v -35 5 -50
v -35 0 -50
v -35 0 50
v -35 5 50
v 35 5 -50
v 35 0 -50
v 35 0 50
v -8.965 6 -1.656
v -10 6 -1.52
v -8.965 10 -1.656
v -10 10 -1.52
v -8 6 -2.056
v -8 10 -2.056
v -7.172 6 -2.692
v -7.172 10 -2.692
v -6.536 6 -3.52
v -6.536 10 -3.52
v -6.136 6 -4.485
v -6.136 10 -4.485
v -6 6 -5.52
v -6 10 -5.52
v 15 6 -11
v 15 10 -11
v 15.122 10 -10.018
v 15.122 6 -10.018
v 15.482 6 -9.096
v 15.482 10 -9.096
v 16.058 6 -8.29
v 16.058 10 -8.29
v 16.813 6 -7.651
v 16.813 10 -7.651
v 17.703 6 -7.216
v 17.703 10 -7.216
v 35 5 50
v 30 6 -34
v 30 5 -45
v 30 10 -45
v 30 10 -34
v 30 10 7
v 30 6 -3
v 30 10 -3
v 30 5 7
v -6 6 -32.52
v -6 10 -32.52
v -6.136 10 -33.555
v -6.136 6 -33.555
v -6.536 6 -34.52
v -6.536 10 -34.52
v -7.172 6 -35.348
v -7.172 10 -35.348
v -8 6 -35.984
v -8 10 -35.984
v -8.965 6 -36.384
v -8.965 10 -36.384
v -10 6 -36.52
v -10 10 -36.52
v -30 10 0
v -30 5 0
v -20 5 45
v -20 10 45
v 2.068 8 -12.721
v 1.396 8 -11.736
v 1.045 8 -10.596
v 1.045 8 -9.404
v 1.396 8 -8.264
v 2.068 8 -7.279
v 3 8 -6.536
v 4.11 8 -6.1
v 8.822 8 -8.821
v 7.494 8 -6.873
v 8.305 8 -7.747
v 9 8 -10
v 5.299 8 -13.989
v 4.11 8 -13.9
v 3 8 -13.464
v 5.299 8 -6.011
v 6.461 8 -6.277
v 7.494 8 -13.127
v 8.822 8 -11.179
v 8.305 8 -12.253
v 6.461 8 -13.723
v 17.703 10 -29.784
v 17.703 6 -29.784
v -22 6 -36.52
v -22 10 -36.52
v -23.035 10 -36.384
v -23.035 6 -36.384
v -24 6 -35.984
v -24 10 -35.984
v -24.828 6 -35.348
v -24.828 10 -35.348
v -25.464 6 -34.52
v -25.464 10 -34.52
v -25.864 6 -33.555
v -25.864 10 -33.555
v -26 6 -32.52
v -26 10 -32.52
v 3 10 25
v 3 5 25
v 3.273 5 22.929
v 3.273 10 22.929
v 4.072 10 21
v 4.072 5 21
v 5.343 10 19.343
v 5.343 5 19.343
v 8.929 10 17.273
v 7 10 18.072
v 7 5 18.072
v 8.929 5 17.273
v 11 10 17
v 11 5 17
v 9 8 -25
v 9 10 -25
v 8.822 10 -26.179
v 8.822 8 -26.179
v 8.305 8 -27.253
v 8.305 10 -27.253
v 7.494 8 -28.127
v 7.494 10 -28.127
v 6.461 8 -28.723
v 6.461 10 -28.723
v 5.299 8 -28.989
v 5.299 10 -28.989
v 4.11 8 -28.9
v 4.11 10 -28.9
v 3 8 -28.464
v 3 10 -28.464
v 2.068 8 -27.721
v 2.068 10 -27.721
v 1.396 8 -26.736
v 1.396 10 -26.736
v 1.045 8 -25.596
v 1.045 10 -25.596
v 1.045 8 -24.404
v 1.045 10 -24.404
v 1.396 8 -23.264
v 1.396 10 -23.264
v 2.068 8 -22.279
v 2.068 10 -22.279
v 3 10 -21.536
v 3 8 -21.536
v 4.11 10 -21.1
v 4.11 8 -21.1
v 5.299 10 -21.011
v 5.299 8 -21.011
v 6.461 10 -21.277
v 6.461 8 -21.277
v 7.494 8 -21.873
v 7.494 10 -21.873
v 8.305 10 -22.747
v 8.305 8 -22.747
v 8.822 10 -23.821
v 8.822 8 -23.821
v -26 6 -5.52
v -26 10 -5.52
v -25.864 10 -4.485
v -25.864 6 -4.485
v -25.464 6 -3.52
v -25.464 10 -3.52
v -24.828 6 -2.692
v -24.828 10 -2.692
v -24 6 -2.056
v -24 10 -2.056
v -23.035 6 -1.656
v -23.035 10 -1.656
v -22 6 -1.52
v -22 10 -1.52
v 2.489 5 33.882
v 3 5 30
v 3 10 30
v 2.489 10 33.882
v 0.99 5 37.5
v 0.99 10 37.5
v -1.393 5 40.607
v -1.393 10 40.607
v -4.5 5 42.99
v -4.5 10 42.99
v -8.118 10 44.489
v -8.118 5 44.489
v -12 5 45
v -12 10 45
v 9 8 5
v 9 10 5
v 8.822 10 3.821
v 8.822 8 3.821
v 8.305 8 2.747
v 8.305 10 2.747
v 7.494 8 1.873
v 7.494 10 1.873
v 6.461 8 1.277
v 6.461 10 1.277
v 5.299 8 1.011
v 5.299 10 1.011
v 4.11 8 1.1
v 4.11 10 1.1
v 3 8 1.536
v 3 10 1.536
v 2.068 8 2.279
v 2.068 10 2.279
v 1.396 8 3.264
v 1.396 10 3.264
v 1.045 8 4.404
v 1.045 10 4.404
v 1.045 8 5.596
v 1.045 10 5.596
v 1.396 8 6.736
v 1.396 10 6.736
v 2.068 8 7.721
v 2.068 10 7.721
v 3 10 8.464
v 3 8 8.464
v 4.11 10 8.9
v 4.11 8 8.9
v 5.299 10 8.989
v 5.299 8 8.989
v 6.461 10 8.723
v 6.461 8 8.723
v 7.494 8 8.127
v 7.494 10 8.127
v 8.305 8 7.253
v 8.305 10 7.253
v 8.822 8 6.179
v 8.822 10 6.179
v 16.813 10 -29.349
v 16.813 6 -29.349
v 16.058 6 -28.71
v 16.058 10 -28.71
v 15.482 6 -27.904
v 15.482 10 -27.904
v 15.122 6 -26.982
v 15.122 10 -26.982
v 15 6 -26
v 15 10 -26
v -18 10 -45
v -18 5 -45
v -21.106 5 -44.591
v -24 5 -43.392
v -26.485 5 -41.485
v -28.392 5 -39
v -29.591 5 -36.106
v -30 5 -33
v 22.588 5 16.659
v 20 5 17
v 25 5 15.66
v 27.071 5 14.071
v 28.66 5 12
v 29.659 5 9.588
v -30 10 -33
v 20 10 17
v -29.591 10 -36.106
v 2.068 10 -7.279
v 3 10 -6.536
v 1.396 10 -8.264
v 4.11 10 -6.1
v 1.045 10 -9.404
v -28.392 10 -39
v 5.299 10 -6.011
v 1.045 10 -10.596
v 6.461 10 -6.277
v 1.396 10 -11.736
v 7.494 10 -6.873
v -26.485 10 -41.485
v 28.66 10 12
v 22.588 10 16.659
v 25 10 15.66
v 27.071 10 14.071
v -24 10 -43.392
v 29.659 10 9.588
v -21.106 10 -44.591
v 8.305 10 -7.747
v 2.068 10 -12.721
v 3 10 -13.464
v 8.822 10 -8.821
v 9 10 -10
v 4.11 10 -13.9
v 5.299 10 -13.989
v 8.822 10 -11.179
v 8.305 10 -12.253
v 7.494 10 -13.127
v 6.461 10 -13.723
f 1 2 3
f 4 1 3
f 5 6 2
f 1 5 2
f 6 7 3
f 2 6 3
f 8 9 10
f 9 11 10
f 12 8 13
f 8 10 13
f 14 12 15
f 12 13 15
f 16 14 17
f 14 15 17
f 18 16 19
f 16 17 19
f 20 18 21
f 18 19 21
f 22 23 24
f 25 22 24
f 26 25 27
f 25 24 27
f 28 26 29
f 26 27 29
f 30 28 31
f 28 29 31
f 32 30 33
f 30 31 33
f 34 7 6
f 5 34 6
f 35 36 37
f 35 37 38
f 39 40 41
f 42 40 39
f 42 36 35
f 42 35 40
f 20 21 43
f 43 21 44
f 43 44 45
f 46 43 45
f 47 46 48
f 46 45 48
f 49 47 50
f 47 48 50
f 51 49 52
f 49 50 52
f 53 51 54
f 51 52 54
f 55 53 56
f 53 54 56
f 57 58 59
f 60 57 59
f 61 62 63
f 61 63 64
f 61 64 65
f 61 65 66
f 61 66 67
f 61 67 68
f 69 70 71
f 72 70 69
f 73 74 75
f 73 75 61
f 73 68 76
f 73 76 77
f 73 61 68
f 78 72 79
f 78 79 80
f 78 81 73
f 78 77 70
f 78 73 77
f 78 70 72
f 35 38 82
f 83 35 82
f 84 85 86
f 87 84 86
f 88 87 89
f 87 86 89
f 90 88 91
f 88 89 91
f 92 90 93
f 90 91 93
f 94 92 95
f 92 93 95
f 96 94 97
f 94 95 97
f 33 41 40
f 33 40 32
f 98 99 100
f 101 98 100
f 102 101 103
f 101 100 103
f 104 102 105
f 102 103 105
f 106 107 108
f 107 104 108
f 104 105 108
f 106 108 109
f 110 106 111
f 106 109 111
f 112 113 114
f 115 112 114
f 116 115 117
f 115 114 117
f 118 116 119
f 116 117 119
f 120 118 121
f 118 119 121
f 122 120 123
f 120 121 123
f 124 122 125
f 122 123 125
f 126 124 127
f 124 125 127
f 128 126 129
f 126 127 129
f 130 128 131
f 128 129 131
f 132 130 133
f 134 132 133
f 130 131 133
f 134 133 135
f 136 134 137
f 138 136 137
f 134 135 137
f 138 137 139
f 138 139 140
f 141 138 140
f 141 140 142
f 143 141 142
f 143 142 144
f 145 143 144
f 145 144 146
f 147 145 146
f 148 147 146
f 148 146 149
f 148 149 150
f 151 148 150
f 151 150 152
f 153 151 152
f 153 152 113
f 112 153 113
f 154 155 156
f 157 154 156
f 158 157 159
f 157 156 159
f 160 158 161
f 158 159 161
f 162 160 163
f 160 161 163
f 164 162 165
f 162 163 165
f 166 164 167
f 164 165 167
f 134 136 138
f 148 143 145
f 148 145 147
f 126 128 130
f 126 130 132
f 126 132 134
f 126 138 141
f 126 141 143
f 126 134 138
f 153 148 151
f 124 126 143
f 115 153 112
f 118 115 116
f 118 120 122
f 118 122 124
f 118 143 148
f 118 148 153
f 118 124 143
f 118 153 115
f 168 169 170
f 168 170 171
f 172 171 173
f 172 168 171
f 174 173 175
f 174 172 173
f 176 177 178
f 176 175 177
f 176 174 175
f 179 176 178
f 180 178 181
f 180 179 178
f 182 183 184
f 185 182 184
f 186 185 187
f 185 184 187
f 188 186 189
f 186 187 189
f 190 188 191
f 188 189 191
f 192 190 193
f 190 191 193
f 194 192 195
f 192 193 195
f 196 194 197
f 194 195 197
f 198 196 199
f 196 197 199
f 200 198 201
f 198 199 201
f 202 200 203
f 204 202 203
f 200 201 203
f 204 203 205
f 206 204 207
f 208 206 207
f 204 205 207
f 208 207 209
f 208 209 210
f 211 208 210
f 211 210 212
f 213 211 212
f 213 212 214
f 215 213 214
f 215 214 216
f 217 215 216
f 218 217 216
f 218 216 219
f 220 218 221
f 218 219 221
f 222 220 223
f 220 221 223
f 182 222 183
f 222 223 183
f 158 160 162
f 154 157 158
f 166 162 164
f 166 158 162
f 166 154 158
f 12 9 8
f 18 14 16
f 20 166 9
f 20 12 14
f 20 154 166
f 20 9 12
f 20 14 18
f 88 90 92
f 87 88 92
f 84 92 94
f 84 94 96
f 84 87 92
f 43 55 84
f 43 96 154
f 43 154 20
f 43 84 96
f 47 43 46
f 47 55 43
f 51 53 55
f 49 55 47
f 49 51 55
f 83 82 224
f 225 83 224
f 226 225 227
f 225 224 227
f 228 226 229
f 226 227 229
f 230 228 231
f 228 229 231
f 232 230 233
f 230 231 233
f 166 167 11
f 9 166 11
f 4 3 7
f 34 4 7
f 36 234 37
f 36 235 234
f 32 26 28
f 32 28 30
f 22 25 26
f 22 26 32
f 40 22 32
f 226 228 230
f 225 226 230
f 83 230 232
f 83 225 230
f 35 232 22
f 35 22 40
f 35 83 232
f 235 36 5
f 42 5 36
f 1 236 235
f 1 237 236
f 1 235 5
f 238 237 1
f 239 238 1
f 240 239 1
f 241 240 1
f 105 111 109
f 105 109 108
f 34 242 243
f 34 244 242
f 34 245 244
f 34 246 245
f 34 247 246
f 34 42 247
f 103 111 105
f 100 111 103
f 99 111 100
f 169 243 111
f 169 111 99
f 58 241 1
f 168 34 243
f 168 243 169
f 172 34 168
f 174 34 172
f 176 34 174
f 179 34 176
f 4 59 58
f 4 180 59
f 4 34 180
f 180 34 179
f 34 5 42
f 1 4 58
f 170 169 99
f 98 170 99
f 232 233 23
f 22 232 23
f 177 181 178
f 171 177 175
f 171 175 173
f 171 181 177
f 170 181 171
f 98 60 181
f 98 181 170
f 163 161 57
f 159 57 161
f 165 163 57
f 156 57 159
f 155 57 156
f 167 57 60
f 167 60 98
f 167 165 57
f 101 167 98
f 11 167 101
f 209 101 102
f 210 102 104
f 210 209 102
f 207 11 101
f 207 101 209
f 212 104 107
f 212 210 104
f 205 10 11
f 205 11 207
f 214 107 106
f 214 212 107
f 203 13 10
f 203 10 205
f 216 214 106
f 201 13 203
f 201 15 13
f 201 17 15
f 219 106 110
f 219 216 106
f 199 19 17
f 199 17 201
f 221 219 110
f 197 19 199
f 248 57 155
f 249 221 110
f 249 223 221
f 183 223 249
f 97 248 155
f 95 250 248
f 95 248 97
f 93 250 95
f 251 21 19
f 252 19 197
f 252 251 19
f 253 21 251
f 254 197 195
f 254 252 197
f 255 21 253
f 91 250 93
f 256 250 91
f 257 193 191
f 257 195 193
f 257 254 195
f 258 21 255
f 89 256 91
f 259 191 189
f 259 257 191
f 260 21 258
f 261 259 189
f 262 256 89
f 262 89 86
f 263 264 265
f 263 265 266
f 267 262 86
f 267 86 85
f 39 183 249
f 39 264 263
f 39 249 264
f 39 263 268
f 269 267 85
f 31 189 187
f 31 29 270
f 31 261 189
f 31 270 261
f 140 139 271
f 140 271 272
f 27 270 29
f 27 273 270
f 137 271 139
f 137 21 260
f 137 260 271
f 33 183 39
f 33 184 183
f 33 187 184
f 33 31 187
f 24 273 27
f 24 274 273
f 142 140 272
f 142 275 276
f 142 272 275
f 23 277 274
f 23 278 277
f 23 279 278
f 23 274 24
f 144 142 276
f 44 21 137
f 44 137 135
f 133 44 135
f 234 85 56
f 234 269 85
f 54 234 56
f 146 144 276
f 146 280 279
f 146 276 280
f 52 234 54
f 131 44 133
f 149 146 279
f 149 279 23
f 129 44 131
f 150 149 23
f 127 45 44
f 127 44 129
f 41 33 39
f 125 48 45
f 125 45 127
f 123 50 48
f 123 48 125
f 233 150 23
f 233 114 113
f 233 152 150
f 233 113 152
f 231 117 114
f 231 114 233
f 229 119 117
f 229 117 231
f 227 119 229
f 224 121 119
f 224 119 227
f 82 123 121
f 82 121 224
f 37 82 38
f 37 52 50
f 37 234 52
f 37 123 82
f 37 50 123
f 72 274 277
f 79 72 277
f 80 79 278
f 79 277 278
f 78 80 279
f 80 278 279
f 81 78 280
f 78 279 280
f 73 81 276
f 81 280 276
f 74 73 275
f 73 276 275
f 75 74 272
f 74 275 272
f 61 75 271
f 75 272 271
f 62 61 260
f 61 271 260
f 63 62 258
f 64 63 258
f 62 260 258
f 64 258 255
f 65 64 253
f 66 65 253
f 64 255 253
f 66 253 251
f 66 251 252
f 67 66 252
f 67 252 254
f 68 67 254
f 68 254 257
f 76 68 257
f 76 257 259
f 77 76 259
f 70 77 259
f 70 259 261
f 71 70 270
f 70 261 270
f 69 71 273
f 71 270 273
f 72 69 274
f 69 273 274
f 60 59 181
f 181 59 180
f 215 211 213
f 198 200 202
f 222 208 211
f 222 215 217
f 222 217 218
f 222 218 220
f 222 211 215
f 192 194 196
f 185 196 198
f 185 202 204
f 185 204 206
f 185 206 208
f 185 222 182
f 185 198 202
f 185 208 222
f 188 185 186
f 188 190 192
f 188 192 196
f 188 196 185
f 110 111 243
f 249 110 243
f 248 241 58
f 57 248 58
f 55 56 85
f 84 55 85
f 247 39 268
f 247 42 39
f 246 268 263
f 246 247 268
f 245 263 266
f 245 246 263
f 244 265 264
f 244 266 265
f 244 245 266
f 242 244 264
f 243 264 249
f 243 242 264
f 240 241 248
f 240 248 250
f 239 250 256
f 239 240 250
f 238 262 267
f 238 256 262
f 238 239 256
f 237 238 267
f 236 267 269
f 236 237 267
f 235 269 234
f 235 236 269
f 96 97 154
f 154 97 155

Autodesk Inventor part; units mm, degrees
ref_plane "YZ Plane" through (0, 0, 0) normal (1, 0, 0) x (0, 1, 0)
ref_plane "XZ Plane" through (0, 0, 0) normal (0, 1, 0) x (-1, 0, 0)
ref_plane "XY Plane" through (0, 0, 0) normal (0, 0, 1) x (1, 0, 0)
sketch "Sketch1" plane through (0, 0, 0) normal (0, 1, 0) x (-1, 0, 0)
  line L0 (35, 50) -> (-35, 50)
  line L1 (-35, 50) -> (-35, -50)
  line L2 (-35, -50) -> (35, -50)
  line L3 (35, -50) -> (35, 50)
  line L4 (35, 50) -> (-35, -50) construction
  line L5 (-35, 50) -> (35, -50) construction
  point P0 (0, 0)
  dimension "d0" = 100
  dimension "d1" = 70
extrude "Extrusion1" add sketch "Sketch1" along normal blind 5
sketch "Sketch2" plane through (0, 5, 0) normal (0, 1, 0) x (1, 0, 0)
  line L0 (30, 45) -> (30, -7)
  line L1 (-18, 45) -> (30, 45)
  line L2 (-35, -50) -> (35, -50) projected
  line L3 (35, -50) -> (35, 50) projected
  arc A0 (-18, 45) -> (-30, 33) centre (-18, 33) ccw
  line L4 (-30, 33) -> (-30, 0)
  line L5 (-30, 0) -> (-20, -45)
  arc A1 (-12, -45) -> (3, -30) centre (-12, -30) ccw
  line L6 (-20, -45) -> (-12, -45)
  line L7 (3, -30) -> (3, -25)
  arc A2 (11, -17) -> (3, -25) centre (11, -25) ccw
  arc A3 (20, -17) -> (30, -7) centre (20, -7) ccw
  line L8 (11, -17) -> (20, -17)
  point P0 (0, 0)
  dimension "d4" = 95
  dimension "d5" = 5
  dimension "d6" = 24
  dimension "d7" = 65
  dimension "d8" = 50
  dimension "d9" = 55
  dimension "d10" = 5
  dimension "d11" = 30
  dimension "d12" = 32
  dimension "d13" = 16
  dimension "d15" = 20
extrude "Extrusion2" add sketch "Sketch2" along normal blind 5
sketch "Sketch3" plane through (0, 10, 0) normal (0, 1, 0) x (1, 0, 0)
  line L0 (-22, 1.52) -> (-10, 1.52)
  line L1 (-6, 5.52) -> (-6, 32.52)
  line L2 (-10, 36.52) -> (-22, 36.52)
  line L3 (-26, 32.52) -> (-26, 5.52)
  line L4 (-23.2444, 1.52) -> (-8.7556, 34.48) construction
  line L5 (-6.9662, 2.9131) -> (-22.5304, 28.9061) construction
  arc A0 (-6, 32.52) -> (-10, 36.52) centre (-10, 32.52) ccw
  arc A1 (-22, 36.52) -> (-26, 32.52) centre (-22, 32.52) ccw
  arc A2 (-26, 5.52) -> (-22, 1.52) centre (-22, 5.52) ccw
  arc A3 (-10, 1.52) -> (-6, 5.52) centre (-10, 5.52) ccw
  line L6 (35, -50) -> (35, 50) projected
  line L7 (-35, -50) -> (35, -50) projected
  line L8 (15, 26) -> (15, 11)
  line L9 (30, 7) -> (30, 30)
  line L10 (30, 30) -> (15, 7) construction
  line L11 (15, 30) -> (30, 7) construction
  line L12 (30, -7) -> (30, 45) projected
  arc A4 (19, 30) -> (15, 26) centre (19, 26) ccw
  arc A5 (15, 11) -> (19, 7) centre (19, 11) ccw
  line L13 (30, 34) -> (17.7027, 29.7838)
  line L14 (30, 3) -> (17.7027, 7.2162)
  line L15 (30, 7) -> (30, 3)
  line L16 (30, 34) -> (30, 30)
  point P0 (0, 0)
  point P1 (-16, 18)
  point P2 (-26, 19.02)
  point P3 (-16, 36.52)
  point P4 (22.5, 18.5)
  point P5 (22.5, 7)
  dimension "d18" = 8
  dimension "d19" = 8
  dimension "d20" = 8
  dimension "d22" = 8
  dimension "d23" = 35
  dimension "d24" = 20
  dimension "d25" = 51
  dimension "d26" = 68
  dimension "d27" = 51
  dimension "d28" = 20
  dimension "d29" = 0
  dimension "d32" = 8
  dimension "d33" = 8
  dimension "d34" = 84
  dimension "d35" = 53
extrude "Extrusion3" cut sketch "Sketch3" against normal blind 4
sketch "Sketch4" plane through (0, 10, 0) normal (0, 1, 0) x (1, 0, 0)
  circle A0 centre (5, -5) radius 4
  circle A1 centre (5, 10) radius 4
  circle A2 centre (5, 25) radius 4
  line L0 (-35, -50) -> (35, -50) projected
  line L1 (35, -50) -> (35, 50) projected
  point P0 (0, 0)
  dimension "d38" = 8
  dimension "d39" = 8
  dimension "d40" = 8
  dimension "d41" = 45
  dimension "d42" = 60
  dimension "d43" = 75
  dimension "d44" = 30
  dimension "d45" = 30
  dimension "d46" = 30
extrude "Extrusion4" cut sketch "Sketch4" against normal blind 2
properties part number "Exercise4"
